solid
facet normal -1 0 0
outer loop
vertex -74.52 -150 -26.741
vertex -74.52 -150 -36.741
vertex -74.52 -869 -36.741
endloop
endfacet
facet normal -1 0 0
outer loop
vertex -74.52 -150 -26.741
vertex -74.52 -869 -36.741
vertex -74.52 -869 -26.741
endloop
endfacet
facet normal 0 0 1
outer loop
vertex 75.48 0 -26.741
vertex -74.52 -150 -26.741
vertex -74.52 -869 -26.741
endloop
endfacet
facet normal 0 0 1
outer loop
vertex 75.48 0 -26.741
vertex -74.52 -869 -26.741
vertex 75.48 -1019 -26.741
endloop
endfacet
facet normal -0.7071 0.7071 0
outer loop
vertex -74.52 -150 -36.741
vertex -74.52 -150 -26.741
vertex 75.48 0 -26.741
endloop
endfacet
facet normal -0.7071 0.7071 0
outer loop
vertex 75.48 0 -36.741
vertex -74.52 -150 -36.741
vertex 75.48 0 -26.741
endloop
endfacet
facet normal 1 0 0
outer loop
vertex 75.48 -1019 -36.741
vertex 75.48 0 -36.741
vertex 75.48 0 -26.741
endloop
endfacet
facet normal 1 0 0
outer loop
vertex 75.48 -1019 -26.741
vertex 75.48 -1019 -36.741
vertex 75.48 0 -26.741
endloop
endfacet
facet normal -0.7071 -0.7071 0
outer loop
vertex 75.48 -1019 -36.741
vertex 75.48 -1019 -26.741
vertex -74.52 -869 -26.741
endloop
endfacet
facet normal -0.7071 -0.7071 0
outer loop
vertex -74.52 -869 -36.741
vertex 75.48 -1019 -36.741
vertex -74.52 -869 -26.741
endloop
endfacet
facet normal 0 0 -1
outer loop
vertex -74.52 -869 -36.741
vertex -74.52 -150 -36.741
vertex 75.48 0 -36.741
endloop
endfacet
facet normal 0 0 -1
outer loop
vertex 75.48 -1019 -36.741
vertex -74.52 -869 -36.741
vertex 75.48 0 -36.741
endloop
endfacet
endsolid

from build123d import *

# Parameters (mm, degrees)
F0_W          = 150
F0_H          = 10
F1_DEPTH      = 1019
F3_DEPTH      = 10.001
F3_DEPTH_BACK = 1540
F5_DEPTH      = 1577
F5_DEPTH_BACK = 10.001


# Not quite as in the source:
# - an extrude ends at something that could not be found from the text; its depth is read off the source's solid


with BuildPart() as f1:
    # F0 (on Front) → F1 (new body)
    with BuildSketch(Plane.XZ):
        with Locations((0.4800241441, -31.7408985884)):
            Rectangle(F0_W, F0_H)
    extrude(amount=F1_DEPTH)

    # F2 (on face) → F3 (cut, two sides)
    with BuildSketch(Plane.XY.offset(-26.7408985884)) as f3_sk:
        Polygon((-74.5199758559, -150), (75.4800241441, 0), (178.0070960522, 169.0949052572), (-164.1357541084, 159.836769104), (-164.1357541084, -150), (-107.9861149192, -156.7480415106), align=None)
    extrude(amount=-F3_DEPTH, mode=Mode.SUBTRACT)
    extrude(f3_sk.sketch, amount=F3_DEPTH_BACK, mode=Mode.SUBTRACT)

    # F4 (on face) → F5 (cut, two sides)
    with BuildSketch(Plane.XY.offset(-26.7408985884)) as f5_sk:
        Polygon((72.7586299181, -1200.1620531082), (75.4800241441, -1019), (-74.5199758559, -869), (-237.236186862, -869), (-237.236186862, -1200.1620531082), align=None)
    extrude(amount=F5_DEPTH, mode=Mode.SUBTRACT)
    extrude(f5_sk.sketch, amount=-F5_DEPTH_BACK, mode=Mode.SUBTRACT)


solid = f1.part
